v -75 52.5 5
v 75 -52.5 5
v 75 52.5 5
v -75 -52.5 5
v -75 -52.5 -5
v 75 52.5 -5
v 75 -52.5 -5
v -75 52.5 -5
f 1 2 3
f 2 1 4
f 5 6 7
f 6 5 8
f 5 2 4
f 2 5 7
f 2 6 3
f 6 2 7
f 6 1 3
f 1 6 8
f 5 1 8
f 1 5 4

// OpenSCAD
// ========================================
// a 150 x 105 x 10 mm box
// NeuroCAD canonical IR; dimensions are millimetres
// ========================================
$fn = 48;

cube(size=[150, 105, 10], center=true);
